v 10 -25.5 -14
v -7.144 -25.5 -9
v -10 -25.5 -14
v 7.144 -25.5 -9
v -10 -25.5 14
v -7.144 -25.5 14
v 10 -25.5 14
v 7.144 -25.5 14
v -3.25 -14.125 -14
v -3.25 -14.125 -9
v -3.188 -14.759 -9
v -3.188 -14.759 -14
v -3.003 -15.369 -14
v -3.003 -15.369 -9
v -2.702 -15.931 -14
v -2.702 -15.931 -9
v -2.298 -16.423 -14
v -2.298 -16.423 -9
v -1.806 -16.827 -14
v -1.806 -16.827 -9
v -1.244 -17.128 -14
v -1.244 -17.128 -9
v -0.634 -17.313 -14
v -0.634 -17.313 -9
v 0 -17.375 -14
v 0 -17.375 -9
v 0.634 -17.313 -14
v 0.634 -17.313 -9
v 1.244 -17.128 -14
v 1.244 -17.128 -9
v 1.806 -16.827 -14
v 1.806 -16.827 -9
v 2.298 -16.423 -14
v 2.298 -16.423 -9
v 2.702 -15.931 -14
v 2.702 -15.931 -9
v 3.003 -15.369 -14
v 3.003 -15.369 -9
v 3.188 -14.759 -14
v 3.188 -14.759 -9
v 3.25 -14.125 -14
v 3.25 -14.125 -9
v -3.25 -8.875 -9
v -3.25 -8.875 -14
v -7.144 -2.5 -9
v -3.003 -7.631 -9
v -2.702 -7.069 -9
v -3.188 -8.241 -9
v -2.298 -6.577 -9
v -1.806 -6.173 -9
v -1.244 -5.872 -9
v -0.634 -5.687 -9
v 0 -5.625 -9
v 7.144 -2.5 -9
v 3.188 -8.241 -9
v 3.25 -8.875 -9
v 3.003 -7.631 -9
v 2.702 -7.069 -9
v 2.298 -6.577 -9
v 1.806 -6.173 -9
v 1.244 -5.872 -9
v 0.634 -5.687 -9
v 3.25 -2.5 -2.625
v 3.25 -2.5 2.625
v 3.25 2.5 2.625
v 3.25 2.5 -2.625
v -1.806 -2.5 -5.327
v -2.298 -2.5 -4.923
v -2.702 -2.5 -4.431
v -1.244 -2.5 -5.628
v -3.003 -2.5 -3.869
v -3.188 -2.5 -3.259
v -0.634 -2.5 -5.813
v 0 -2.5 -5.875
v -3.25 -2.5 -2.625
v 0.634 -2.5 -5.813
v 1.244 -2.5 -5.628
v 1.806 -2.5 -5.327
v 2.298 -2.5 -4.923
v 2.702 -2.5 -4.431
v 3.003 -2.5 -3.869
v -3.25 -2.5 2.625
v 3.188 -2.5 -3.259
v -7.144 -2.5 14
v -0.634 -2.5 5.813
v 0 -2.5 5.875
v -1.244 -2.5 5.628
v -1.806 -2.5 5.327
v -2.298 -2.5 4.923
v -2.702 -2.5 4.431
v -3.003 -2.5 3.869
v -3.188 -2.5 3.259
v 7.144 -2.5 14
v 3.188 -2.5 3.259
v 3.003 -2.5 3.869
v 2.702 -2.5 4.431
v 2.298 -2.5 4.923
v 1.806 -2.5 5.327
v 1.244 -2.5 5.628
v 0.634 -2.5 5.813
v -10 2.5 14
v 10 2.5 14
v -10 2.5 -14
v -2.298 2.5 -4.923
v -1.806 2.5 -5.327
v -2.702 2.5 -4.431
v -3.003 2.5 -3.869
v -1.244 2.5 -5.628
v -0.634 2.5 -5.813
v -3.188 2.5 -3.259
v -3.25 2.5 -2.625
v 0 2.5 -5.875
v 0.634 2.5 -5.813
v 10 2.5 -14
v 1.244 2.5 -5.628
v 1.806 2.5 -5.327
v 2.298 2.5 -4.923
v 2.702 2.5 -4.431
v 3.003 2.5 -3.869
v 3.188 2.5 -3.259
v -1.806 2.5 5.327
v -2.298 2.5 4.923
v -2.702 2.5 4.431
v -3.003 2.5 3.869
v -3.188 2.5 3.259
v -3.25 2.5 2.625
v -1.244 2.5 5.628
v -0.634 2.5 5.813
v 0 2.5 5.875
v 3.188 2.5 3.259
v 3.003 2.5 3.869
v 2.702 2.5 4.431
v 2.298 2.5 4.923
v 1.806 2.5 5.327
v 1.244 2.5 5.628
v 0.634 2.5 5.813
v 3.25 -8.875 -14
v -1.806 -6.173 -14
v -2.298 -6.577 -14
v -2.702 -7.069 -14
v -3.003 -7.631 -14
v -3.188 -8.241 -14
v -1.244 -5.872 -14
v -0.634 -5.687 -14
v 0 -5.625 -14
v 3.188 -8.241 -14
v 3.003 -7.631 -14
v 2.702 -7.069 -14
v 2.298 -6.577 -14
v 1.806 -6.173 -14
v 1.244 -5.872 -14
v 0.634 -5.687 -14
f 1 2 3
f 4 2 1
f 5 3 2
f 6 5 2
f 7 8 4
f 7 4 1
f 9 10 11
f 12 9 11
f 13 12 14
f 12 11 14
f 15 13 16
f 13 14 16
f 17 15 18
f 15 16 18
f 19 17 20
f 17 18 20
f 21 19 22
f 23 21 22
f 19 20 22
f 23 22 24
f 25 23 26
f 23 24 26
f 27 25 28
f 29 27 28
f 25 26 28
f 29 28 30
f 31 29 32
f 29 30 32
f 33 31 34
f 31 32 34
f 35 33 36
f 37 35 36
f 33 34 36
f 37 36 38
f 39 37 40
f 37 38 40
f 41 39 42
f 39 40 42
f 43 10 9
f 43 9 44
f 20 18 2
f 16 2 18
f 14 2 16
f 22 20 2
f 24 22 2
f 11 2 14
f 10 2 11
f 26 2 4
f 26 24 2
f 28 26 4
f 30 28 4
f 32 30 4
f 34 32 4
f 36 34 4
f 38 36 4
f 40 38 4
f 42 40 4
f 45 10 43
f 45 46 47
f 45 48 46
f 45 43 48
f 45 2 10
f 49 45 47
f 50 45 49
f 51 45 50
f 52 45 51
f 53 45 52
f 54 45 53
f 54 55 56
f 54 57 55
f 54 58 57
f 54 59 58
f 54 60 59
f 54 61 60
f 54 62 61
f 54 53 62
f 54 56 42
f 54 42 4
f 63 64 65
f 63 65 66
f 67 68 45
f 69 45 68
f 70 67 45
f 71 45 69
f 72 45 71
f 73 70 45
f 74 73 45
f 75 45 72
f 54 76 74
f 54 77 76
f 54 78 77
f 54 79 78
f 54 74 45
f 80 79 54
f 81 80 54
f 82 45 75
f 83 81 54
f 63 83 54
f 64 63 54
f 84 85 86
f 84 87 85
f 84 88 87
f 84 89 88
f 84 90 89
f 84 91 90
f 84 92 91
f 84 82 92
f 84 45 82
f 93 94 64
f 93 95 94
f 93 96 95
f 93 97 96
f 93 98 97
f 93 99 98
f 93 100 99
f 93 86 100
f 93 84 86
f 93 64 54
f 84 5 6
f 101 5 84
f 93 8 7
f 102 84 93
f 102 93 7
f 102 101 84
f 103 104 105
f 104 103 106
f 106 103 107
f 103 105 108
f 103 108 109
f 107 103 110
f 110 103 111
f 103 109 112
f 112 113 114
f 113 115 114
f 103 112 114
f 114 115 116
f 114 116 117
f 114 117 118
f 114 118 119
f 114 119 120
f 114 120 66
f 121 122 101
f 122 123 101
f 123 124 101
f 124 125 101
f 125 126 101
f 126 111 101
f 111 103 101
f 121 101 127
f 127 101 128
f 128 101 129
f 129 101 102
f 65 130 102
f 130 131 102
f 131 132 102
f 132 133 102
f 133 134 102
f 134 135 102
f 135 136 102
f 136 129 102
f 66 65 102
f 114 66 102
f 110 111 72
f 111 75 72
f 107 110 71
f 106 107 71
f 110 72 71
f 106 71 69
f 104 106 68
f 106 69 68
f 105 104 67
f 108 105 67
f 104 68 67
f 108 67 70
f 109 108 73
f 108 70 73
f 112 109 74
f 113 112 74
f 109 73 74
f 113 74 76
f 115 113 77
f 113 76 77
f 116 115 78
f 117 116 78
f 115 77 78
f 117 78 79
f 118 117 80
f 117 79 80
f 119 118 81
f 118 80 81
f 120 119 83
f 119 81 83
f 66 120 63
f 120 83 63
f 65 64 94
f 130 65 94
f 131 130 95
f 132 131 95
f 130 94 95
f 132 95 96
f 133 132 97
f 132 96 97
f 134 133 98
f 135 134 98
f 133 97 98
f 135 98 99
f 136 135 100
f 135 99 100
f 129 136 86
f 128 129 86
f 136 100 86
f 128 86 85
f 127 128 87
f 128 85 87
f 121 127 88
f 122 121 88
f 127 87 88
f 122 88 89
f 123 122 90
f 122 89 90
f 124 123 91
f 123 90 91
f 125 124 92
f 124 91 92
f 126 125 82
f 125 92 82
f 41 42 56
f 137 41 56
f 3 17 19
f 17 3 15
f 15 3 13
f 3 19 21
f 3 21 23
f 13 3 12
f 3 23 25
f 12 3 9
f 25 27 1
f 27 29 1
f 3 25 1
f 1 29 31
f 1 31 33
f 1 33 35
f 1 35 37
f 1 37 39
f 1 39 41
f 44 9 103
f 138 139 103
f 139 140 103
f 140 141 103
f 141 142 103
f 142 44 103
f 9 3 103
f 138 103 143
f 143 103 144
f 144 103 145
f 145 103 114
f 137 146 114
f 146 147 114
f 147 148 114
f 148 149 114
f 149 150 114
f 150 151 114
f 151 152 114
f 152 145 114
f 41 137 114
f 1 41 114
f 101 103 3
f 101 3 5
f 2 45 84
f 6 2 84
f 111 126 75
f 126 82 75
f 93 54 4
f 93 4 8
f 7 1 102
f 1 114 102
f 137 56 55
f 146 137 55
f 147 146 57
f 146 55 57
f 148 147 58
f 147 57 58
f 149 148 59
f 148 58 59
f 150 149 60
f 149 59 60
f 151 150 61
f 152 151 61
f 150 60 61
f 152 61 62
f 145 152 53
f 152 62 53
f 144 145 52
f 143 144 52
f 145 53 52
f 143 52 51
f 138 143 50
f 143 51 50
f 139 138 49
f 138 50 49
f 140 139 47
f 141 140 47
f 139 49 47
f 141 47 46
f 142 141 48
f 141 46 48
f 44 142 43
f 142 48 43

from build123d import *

# Parameters (mm, degrees)
SKETCH001_W  = 20
SKETCH001_H  = 28
PAD001_DEPTH = 2.5
SKETCH002_W  = 20
SKETCH002_H  = 5
PAD002_DEPTH = 23
POCKET_DEPTH = 5
SKETCH004_W  = 2.855627
SKETCH004_H  = 23
PAD003_DEPTH = 23


with BuildPart() as part:
    # Sketch001 → Pad001 (new body, symmetric)
    with BuildSketch(Plane.XZ):
        Rectangle(SKETCH001_W, SKETCH001_H)
        with BuildLine():
            ThreePointArc((3.25, 2.625), (0, 5.875), (-3.25, 2.625))
            Line((-3.25, 2.625), (-3.25, -2.625))
            ThreePointArc((-3.25, -2.625), (0, -5.875), (3.25, -2.625))
            Line((3.25, 2.625), (3.25, -2.625))
        make_face(mode=Mode.SUBTRACT)
    extrude(amount=PAD001_DEPTH, both=True)

    # Sketch002 (on Face10 of Pad001) → Pad002 (join)
    with BuildSketch(Plane.XZ.offset(2.5)):
        with Locations((0, -11.5)):
            Rectangle(SKETCH002_W, SKETCH002_H)
    extrude(amount=PAD002_DEPTH)

    # Sketch003 (on Face13 of Pad002) → Pocket (cut)
    with BuildSketch(Plane(origin=(0, 0, -9), x_dir=(-1, 0, 0), z_dir=(0, 0, 1))):
        with BuildLine():
            ThreePointArc((3.25, 14.125), (0, 17.375), (-3.25, 14.125))
            Line((-3.25, 14.125), (-3.25, 8.875))
            ThreePointArc((-3.25, 8.875), (0, 5.625), (3.25, 8.875))
            Line((3.25, 14.125), (3.25, 8.875))
        make_face()
    extrude(amount=-POCKET_DEPTH, mode=Mode.SUBTRACT)

    # Sketch004 (on Face5 of Pocket) → Pad003 (join)
    with BuildSketch(Plane.XZ.offset(2.5)):
        with Locations((-8.5721865, 2.5)):
            Rectangle(SKETCH004_W, SKETCH004_H)
        with Locations((8.5721865, 2.5)):
            Rectangle(SKETCH004_W, SKETCH004_H)
    extrude(amount=PAD003_DEPTH)


solid = part.part
